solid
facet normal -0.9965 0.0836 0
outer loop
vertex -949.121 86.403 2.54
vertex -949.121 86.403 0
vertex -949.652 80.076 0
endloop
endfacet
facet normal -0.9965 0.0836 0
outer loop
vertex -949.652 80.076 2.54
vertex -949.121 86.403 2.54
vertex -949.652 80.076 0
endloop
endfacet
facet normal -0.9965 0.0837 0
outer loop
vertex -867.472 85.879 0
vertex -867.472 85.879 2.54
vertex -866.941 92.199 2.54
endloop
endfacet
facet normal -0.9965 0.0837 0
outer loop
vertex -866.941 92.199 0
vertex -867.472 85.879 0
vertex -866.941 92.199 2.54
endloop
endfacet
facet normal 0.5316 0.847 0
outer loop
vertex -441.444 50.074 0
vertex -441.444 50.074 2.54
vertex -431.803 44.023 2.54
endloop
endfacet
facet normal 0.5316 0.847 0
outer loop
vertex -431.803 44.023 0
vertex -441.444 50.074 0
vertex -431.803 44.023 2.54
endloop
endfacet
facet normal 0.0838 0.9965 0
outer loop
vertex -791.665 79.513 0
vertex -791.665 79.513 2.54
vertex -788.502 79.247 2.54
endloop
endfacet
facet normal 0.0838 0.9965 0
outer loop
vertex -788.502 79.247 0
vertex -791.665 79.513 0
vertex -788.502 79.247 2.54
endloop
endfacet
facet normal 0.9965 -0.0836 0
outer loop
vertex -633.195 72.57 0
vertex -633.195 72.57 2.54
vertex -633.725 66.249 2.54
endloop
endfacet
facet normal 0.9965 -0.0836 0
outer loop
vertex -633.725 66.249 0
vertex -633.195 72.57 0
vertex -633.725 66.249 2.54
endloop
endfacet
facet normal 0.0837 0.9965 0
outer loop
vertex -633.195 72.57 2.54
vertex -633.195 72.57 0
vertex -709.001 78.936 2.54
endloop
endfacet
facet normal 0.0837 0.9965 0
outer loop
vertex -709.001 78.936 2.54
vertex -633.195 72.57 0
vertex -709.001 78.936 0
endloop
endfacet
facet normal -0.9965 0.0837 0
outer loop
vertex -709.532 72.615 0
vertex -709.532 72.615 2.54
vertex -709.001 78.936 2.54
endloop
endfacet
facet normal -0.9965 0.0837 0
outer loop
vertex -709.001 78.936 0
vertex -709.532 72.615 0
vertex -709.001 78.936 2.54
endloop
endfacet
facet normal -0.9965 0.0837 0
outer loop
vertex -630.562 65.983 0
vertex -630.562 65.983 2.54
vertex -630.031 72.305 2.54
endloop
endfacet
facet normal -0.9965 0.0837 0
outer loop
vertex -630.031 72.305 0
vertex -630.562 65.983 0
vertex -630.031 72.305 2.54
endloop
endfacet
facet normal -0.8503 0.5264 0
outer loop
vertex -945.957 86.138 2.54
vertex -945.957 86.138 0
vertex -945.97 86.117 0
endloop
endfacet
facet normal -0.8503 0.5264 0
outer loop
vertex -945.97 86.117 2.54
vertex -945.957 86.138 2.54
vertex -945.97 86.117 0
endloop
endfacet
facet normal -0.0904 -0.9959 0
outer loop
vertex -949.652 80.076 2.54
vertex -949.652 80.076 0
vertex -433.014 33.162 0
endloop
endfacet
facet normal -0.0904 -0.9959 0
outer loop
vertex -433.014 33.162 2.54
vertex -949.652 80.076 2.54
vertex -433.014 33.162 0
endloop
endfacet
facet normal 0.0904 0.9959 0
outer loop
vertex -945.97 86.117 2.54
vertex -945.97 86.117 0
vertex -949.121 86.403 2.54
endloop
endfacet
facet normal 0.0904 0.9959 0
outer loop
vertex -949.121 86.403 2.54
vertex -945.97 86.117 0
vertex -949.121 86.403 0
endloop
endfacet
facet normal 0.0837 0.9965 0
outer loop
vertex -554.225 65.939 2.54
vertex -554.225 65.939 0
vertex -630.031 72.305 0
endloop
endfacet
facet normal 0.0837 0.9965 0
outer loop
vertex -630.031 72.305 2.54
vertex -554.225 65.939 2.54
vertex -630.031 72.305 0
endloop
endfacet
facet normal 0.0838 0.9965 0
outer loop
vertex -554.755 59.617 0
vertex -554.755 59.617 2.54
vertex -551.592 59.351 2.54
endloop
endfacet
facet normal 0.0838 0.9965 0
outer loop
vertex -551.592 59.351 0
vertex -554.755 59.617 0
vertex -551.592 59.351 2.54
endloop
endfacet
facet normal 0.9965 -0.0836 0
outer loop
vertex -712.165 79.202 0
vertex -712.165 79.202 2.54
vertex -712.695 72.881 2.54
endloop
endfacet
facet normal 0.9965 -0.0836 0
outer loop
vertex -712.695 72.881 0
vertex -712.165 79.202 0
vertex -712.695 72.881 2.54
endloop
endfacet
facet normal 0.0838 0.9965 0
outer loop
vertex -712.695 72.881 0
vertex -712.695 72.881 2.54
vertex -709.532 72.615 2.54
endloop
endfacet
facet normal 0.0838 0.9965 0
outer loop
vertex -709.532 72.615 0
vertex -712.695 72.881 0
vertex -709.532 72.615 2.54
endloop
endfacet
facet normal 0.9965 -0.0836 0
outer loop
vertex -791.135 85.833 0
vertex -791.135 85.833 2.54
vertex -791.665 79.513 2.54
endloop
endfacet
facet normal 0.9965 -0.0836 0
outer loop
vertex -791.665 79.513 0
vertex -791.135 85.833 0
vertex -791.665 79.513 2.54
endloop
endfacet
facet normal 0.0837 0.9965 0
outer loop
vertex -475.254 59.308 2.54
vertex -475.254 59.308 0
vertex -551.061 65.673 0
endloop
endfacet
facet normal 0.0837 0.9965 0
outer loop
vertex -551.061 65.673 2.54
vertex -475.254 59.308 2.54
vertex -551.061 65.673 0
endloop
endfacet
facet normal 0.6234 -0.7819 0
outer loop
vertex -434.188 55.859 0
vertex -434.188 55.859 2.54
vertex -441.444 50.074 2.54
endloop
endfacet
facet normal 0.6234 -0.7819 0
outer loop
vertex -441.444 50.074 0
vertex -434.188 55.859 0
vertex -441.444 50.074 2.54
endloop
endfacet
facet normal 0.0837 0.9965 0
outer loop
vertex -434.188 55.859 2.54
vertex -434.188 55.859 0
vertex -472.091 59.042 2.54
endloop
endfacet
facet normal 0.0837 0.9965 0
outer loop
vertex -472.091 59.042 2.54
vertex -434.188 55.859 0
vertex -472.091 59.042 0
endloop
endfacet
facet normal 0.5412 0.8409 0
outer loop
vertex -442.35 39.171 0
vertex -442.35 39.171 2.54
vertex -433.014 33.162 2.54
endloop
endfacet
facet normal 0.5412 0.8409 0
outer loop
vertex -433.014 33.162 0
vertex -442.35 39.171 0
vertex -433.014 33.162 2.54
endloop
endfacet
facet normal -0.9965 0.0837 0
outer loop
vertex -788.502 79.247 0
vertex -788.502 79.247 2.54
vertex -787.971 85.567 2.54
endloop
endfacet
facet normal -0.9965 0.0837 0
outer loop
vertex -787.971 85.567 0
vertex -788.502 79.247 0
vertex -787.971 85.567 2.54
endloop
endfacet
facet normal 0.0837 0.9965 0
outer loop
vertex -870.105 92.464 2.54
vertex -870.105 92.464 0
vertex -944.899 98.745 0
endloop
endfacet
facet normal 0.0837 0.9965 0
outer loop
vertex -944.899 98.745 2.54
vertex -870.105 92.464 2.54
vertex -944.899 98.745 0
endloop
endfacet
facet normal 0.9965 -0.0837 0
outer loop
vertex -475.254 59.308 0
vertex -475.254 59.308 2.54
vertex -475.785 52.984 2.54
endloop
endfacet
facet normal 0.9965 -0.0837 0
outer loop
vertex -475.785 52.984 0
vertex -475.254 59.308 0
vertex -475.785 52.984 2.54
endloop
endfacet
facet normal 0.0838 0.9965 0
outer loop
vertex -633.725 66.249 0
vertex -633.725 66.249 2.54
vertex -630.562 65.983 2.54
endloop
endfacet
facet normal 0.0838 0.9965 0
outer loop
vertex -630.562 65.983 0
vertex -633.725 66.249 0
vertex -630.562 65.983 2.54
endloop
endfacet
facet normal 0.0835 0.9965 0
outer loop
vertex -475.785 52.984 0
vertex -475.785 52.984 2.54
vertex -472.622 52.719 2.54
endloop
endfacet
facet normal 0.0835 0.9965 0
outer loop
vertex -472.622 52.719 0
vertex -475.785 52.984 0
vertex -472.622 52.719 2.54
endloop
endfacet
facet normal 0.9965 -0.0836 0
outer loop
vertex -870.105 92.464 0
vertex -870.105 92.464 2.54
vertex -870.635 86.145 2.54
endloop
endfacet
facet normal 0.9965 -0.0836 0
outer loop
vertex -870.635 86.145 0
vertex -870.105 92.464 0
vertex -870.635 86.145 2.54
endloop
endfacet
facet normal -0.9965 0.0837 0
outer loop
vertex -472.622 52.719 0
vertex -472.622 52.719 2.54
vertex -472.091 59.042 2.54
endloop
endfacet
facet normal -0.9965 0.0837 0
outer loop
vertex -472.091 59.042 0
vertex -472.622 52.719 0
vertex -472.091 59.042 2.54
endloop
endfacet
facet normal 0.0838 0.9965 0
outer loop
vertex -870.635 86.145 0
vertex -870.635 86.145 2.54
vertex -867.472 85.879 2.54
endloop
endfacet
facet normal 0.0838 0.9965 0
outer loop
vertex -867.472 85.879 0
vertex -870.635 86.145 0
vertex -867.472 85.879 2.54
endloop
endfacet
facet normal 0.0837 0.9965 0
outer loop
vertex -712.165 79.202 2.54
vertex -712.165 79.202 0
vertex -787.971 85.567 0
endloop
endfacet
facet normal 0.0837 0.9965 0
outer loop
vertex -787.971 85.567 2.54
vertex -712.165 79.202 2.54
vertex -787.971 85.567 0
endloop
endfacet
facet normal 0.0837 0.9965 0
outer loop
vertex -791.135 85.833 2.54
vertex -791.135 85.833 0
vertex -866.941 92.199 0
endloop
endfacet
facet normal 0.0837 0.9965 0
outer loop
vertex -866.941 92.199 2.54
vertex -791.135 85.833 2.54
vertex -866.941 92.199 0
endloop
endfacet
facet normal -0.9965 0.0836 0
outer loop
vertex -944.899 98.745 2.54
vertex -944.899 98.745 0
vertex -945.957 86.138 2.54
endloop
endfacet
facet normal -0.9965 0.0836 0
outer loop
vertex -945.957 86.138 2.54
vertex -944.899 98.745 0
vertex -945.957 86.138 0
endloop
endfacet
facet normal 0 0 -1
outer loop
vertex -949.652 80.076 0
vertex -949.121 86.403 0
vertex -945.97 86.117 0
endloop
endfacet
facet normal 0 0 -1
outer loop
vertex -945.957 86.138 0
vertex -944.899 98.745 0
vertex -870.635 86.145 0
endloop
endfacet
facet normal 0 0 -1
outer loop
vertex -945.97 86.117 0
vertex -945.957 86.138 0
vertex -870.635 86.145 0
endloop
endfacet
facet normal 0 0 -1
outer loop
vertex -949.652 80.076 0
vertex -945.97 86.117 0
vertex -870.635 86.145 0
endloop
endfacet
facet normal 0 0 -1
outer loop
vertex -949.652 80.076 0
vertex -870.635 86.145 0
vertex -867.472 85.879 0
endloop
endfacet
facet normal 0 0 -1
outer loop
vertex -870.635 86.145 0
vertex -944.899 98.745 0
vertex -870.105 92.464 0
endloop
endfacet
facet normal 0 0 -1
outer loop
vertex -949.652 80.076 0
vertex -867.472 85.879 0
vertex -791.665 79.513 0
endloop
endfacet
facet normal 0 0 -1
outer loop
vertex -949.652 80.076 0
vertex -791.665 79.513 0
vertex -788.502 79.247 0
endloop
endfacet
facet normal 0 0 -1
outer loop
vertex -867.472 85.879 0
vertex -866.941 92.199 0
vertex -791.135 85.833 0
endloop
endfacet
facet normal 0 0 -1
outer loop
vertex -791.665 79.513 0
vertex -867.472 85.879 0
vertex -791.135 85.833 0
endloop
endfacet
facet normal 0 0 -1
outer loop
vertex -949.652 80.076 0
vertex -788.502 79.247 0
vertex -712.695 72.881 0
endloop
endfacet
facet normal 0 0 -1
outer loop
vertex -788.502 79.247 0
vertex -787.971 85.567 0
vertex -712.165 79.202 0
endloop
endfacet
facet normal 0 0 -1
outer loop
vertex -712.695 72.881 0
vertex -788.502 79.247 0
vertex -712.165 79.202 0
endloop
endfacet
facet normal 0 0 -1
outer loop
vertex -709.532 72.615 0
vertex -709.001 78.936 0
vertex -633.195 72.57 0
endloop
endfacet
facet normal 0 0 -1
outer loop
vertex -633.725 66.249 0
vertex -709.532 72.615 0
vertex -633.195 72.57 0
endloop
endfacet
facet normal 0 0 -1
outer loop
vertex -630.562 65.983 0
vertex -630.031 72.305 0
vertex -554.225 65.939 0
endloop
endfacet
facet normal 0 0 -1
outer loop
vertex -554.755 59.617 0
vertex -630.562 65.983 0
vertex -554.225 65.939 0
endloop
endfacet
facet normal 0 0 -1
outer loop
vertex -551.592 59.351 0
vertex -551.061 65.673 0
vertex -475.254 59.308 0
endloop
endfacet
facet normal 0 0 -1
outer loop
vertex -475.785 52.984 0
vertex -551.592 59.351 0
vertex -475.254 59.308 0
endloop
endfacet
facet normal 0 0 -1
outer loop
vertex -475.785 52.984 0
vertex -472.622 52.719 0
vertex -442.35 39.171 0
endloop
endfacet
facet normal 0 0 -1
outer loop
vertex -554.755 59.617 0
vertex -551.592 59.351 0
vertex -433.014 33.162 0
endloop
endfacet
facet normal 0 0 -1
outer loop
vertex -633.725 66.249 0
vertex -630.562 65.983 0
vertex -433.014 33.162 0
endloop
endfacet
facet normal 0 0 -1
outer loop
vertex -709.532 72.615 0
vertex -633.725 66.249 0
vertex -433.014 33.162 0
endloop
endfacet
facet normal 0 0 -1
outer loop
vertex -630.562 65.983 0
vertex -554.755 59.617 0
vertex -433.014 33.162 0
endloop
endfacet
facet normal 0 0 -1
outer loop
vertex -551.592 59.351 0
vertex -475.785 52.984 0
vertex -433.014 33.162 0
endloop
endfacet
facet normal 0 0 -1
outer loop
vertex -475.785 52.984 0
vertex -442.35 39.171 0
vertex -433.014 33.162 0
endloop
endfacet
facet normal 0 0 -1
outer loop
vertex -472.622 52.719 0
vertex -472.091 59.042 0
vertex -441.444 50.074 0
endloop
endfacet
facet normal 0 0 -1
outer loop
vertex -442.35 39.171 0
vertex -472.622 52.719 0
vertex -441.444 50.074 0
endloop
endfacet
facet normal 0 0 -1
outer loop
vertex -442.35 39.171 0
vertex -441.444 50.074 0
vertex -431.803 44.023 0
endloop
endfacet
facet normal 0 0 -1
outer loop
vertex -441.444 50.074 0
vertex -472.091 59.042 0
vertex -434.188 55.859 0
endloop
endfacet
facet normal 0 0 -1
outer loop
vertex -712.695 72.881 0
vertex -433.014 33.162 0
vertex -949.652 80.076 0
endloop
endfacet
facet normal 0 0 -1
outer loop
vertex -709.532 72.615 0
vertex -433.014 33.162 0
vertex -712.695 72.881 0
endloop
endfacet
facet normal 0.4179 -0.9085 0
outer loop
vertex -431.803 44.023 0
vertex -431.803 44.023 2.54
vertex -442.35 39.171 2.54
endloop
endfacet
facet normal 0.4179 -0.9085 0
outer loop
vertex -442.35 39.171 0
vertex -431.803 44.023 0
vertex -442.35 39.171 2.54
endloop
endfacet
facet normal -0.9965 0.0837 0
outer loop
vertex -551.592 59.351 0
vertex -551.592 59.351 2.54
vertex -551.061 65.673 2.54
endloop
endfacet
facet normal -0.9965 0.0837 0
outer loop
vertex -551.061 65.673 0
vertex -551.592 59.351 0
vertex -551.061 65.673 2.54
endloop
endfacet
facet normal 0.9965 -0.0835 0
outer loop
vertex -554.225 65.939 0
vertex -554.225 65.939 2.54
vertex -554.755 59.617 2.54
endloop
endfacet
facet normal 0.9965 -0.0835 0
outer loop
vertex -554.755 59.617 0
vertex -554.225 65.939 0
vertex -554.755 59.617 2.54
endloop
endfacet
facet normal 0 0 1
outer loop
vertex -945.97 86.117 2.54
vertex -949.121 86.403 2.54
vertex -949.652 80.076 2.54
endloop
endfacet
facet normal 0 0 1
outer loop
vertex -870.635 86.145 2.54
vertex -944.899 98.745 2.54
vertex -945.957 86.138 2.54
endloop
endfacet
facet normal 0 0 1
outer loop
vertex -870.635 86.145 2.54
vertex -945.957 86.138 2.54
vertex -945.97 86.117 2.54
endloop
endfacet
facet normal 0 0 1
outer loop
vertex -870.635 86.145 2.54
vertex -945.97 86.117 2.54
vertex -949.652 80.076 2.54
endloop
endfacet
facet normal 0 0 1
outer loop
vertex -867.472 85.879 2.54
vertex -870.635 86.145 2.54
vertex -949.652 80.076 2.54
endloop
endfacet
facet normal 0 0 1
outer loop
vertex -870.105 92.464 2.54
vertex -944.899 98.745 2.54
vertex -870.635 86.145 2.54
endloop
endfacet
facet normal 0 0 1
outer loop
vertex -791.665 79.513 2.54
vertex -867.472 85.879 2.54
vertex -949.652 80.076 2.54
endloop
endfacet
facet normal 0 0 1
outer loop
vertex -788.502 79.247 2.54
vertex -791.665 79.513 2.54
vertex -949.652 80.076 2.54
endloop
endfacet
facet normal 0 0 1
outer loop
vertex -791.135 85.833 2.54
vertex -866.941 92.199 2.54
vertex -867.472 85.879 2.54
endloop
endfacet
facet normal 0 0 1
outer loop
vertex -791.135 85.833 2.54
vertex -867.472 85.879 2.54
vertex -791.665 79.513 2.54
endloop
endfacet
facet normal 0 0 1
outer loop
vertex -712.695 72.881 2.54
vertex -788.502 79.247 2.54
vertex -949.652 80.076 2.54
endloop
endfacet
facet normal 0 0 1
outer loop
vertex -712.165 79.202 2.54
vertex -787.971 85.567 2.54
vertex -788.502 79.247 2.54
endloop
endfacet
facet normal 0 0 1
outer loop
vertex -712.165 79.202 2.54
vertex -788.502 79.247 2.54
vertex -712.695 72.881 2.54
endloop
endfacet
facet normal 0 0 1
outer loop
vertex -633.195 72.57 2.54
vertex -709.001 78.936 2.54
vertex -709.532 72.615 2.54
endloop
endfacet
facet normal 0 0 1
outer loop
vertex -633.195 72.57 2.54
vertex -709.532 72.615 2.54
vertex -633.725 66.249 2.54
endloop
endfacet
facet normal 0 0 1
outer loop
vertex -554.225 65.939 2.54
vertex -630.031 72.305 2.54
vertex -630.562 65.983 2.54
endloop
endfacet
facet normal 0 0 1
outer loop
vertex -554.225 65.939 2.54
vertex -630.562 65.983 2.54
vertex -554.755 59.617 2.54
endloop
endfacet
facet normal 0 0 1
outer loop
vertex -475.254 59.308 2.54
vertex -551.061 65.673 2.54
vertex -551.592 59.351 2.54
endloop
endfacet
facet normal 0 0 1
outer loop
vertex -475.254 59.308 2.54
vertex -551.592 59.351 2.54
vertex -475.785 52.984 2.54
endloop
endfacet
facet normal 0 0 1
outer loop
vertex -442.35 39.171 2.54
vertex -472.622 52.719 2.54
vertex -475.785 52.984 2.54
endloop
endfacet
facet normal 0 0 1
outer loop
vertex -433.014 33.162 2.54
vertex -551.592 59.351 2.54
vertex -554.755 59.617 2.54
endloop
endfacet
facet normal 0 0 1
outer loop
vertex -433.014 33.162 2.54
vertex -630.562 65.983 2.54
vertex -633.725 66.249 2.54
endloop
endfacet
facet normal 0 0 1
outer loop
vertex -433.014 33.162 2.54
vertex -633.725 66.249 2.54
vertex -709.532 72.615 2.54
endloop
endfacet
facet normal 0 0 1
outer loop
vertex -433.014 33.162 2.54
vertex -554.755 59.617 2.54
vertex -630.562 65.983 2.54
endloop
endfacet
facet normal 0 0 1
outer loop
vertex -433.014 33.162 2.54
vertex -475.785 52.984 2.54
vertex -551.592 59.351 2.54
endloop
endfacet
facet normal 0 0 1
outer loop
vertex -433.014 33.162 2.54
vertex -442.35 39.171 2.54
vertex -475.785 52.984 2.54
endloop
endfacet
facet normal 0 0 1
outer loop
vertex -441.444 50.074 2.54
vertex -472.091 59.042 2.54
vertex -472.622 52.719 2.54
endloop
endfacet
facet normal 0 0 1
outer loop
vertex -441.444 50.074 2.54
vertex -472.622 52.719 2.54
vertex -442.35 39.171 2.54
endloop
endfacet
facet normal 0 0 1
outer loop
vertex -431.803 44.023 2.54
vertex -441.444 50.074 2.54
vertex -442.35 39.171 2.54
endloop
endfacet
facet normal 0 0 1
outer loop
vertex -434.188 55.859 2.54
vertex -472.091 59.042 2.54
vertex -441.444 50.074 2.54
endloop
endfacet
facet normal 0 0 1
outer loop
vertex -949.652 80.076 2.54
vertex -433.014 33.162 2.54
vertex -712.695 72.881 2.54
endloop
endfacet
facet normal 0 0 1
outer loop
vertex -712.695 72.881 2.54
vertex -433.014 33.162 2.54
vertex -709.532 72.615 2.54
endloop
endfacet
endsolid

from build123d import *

# Parameters (mm, degrees)
BOSS_EXTRUDE1_DEPTH     = 2.54
CUT_EXTRUDE1_DEPTH      = 1
CUT_EXTRUDE1_DEPTH_BACK = 3.54
CUT_EXTRUDE2_DEPTH      = 7.62


with BuildPart() as part:
    # Sketch1 → Boss-Extrude1 (new body)
    with BuildSketch(Plane.XY):
        Polygon((-945.957227657, 86.137779906), (-945.969713578, 86.1172966), (-949.121092485, 86.403457059), (-949.65244679, 80.075727402), (-9.887238192, -5.25964904), (-6.723373364, -5.525326193), (0, -5.833733414), (152.4, -5.833733414), (152.4, 11.946266586), (139.7, 11.946266586), (139.7, 6.866266586), (136.525, 6.866266586), (136.525, 11.946266586), (95.25, 11.946266586), (95.25, 6.866266586), (92.075, 6.866266586), (92.075, 11.946266586), (79.375, 11.946266586), (79.375, 6.866266586), (76.2, 6.866266586), (76.2, 11.946266586), (69.85, 11.946266586), (25.4, 19.566266586), (19.05, 19.566266586), (19.05, 14.486266586), (15.875, 14.486266586), (15.875, 19.566266586), (3.175, 19.566266586), (3.175, 13.216266586), (0, 13.216266586), (0, 19.566266586), (-1.98607431, 19.566266586), (-4.597956143, 19.785592432), (-5.129310448, 13.457862776), (-8.293175277, 13.723539928), (-7.761820971, 20.051269584), (-944.89858306, 98.744842179), align=None)
    extrude(amount=BOSS_EXTRUDE1_DEPTH)

    # Sketch2 → Cut-Extrude1 (cut, two sides)
    with BuildSketch(Plane.XY.offset(2.54)) as cut_extrude1_sk:
        Polygon((-867.4716203, 85.879017088), (-866.940953695, 92.198557139), (-870.104818523, 92.464234292), (-870.635482595, 86.144724398), align=None)
        Polygon((-788.501617399, 79.246962625), (-787.970887585, 85.567255411), (-791.134752413, 85.832932563), (-791.665479694, 79.512669935), align=None)
        Polygon((-709.531614498, 72.614908162), (-709.000821475, 78.935953682), (-712.164686303, 79.201630835), (-712.695476794, 72.880615473), align=None)
        Polygon((-630.561611597, 65.9828537), (-630.030755365, 72.304651954), (-633.194620194, 72.570329107), (-633.725473893, 66.24856101), align=None)
        Polygon((-551.591608696, 59.350799237), (-551.060689256, 65.673350226), (-554.224554084, 65.939027378), (-554.755470992, 59.616506547), align=None)
        Polygon((-472.621605795, 52.718744774), (-472.090623146, 59.042048497), (-475.254487974, 59.30772565), (-475.785468091, 52.984452084), align=None)
        Polygon((-393.651602894, 46.086690311), (-393.120557036, 52.410746769), (-396.284421864, 52.676423921), (-396.81546519, 46.352397622), align=None)
        Polygon((-314.681599993, 39.454635849), (-314.150490926, 45.77944504), (-317.314355754, 46.045122193), (-317.845462289, 39.720343159), align=None)
        Polygon((-235.711597092, 32.822581386), (-235.180424816, 39.148143312), (-238.344289645, 39.413820465), (-238.875459388, 33.088288696), align=None)
        Polygon((-156.741594191, 26.190526923), (-156.210358707, 32.516841584), (-159.374223535, 32.782518736), (-159.905456487, 26.456234233), align=None)
        Polygon((-77.240292597, 25.885539855), (-80.404157425, 26.151217008), (-80.935453586, 19.824179771), (-77.77159129, 19.55847246), align=None)
    extrude(amount=CUT_EXTRUDE1_DEPTH, mode=Mode.SUBTRACT)
    extrude(cut_extrude1_sk.sketch, amount=-CUT_EXTRUDE1_DEPTH_BACK, mode=Mode.SUBTRACT)

    # Sketch3 → Cut-Extrude2 (cut)
    with BuildSketch(Plane.XY.offset(2.54)):
        Polygon((-434.187522505, 55.859236209), (-441.444486836, 50.074133547), (-431.803024179, 44.022577198), (-442.349656028, 39.171455119), (-433.014300591, 33.162402364), (148.326621663, -67.648294025), (201.247452175, 33.162402364), align=None)
    extrude(amount=-CUT_EXTRUDE2_DEPTH, mode=Mode.SUBTRACT)


solid = part.part
